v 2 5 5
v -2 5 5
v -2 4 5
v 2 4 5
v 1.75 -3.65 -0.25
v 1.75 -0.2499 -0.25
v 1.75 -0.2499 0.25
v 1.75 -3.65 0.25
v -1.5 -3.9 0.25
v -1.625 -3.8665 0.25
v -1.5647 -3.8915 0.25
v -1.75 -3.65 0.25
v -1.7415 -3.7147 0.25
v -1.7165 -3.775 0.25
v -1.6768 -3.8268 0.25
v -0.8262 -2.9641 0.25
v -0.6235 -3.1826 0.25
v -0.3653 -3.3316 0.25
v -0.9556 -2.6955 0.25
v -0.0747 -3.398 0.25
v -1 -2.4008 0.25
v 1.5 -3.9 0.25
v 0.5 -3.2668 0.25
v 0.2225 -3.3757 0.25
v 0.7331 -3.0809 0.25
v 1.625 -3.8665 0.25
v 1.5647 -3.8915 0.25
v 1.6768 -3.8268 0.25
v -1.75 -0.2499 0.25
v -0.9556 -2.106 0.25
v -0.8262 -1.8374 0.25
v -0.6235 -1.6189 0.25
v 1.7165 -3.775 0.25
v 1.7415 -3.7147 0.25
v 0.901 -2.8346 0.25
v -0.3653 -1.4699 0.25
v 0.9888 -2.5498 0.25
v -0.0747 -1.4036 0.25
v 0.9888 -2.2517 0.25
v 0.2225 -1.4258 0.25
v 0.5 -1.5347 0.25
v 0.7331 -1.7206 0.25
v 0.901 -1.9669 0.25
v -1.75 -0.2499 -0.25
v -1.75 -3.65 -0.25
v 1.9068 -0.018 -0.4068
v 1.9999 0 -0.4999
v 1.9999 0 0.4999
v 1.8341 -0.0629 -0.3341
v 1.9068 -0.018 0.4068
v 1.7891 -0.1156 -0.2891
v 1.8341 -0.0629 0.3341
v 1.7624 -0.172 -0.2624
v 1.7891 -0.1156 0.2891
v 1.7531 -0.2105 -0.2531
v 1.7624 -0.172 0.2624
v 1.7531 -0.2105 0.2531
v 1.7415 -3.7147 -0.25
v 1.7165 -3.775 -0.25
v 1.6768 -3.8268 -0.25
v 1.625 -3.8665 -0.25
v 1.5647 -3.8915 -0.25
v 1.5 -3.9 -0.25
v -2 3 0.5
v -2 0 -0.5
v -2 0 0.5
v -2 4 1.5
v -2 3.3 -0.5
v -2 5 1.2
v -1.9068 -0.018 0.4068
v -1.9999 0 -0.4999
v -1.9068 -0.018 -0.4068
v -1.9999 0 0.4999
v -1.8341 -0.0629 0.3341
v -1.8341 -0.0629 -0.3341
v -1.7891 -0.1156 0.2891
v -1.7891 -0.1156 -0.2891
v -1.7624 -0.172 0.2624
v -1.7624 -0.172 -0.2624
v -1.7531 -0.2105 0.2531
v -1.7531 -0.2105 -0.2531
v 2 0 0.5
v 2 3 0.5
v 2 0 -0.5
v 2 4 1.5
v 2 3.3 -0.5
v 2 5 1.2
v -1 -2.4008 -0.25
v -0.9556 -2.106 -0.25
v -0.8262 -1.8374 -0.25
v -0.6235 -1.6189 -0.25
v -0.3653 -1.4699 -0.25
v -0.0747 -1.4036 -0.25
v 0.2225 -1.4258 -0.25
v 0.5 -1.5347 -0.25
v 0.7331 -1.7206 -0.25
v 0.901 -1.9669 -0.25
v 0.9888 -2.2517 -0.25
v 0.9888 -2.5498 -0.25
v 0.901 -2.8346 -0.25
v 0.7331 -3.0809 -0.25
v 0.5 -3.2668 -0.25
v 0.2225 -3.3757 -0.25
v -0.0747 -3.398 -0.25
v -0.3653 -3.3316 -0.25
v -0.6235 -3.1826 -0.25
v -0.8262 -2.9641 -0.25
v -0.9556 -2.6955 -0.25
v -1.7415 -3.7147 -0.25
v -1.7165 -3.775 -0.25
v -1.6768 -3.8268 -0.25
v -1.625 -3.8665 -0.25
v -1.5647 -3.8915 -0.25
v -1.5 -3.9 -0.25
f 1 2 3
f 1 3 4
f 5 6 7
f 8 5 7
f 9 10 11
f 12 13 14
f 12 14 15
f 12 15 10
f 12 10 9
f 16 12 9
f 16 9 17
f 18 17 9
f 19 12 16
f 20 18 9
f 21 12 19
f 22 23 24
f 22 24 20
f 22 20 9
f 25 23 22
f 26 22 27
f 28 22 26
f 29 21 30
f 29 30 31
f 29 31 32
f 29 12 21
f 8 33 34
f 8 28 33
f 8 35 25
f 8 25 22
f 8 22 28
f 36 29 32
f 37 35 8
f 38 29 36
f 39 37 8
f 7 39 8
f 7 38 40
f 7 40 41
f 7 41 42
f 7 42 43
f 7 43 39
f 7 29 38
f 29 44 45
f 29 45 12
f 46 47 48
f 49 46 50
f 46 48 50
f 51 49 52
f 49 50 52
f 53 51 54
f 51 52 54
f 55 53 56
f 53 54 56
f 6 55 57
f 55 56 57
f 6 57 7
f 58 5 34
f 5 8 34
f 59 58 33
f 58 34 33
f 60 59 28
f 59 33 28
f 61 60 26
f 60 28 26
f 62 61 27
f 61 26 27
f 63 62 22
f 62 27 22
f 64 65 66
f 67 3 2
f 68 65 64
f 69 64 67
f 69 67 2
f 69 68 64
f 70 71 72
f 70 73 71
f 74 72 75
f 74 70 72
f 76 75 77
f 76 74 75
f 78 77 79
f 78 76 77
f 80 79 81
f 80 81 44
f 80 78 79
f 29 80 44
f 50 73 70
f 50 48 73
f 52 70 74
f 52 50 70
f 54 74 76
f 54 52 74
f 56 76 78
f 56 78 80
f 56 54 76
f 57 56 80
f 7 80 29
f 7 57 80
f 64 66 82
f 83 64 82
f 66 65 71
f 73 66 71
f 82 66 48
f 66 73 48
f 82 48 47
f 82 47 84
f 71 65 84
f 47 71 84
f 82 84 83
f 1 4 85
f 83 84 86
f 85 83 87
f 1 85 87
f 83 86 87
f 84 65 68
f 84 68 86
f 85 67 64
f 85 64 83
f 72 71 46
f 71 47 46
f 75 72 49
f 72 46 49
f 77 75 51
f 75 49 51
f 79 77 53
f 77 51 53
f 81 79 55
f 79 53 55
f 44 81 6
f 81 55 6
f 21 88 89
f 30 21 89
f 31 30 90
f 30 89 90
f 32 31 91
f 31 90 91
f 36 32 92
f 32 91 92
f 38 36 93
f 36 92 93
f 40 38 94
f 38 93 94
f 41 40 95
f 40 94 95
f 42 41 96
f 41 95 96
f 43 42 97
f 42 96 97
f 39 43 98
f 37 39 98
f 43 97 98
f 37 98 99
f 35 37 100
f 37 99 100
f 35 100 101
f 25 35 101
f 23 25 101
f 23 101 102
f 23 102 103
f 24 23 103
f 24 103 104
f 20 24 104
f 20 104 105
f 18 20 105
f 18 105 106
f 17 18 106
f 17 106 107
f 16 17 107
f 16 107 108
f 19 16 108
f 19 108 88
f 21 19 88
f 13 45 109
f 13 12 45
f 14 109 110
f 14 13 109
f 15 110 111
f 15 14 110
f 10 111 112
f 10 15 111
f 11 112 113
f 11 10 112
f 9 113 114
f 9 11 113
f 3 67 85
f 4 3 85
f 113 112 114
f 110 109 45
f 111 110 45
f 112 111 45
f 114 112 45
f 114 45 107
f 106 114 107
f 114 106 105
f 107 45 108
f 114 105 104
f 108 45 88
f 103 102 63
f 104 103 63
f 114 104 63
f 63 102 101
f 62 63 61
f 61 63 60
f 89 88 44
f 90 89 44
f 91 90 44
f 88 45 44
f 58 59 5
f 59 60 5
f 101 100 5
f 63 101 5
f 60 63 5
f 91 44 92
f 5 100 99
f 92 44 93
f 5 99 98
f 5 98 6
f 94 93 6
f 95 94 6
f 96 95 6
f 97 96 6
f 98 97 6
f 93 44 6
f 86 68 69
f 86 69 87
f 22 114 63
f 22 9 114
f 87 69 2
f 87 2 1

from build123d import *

# Parameters (mm, degrees)
SZKIC1_W                    = 4
SZKIC1_H                    = 1
DODANIE_WYCI_GNI_CIE5_DEPTH = 5
SZKIC6_W                    = 4
SZKIC6_H                    = 1
DODANIE_WYCI_GNI_CIE6_DEPTH = 4.5
SFAZOWANIE2_SIZE            = 1
SFAZOWANIE4_SIZE            = 1.7
SZKIC13_W                   = 3.5
SZKIC13_H                   = 0.5
DODANIE_WYCI_GNI_CIE7_DEPTH = 3.9
ZAOKR_GLENIE1_R             = 0.25
SZKIC14_R                   = 1
WYTNIJ_WYCI_GNI_CIE1_DEPTH  = 3.9
ZAOKR_GLENIE2_R             = 0.25


with BuildPart() as part:
    # Szkic1 → Dodanie-wyciągnięcie5 (new body)
    with BuildSketch(Plane(origin=(0, 0, 0), x_dir=(1, 0, 0), z_dir=(0, 1, 0))):
        Rectangle(SZKIC1_W, SZKIC1_H)
    extrude(amount=DODANIE_WYCI_GNI_CIE5_DEPTH)

    # Szkic6 → Dodanie-wyciągnięcie6 (add)
    with BuildSketch(Plane.XY.offset(0.5)):
        with Locations((0, 4.5)):
            Rectangle(SZKIC6_W, SZKIC6_H)
    extrude(amount=DODANIE_WYCI_GNI_CIE6_DEPTH)

    # Sfazowanie2
    sfazowanie2_edges = [part.edges().sort_by_distance(p)[0] for p in [
        (0, 4, 0.5),
    ]]
    chamfer(sfazowanie2_edges, length=SFAZOWANIE2_SIZE)

    # Sfazowanie4
    sfazowanie4_edges = [part.edges().sort_by_distance(p)[0] for p in [
        (0, 5, -0.5),
    ]]
    chamfer(sfazowanie4_edges, length=SFAZOWANIE4_SIZE)

    # Szkic13 → Dodanie-wyciągnięcie7 (add)
    with BuildSketch(Plane.XZ):
        Rectangle(SZKIC13_W, SZKIC13_H)
    extrude(amount=DODANIE_WYCI_GNI_CIE7_DEPTH)

    # Zaokrąglenie1
    zaokr_glenie1_edges = [part.edges().sort_by_distance(p)[0] for p in [
        (-1.75, 0, 0),
        (0, 0, -0.25),
        (1.75, 0, 0),
        (0, 0, 0.25),
    ]]
    fillet(zaokr_glenie1_edges, radius=ZAOKR_GLENIE1_R - 0.0001)  # a hair under: the kernel refuses the full size

    # Szkic14 → Wytnij-wyciągnięcie1 (cut)
    with BuildSketch(Plane(origin=(0, 0, -0.25), x_dir=(-1, 0, 0), z_dir=(0, 0, -1))):
        with Locations((0, -2.400763045)):
            Circle(SZKIC14_R)
    extrude(amount=-WYTNIJ_WYCI_GNI_CIE1_DEPTH, mode=Mode.SUBTRACT)

    # Zaokrąglenie2
    zaokr_glenie2_edges = [part.edges().sort_by_distance(p)[0] for p in [
        (-1.75, -3.9, 0),
        (1.75, -3.9, 0),
    ]]
    fillet(zaokr_glenie2_edges, radius=ZAOKR_GLENIE2_R)


solid = part.part
